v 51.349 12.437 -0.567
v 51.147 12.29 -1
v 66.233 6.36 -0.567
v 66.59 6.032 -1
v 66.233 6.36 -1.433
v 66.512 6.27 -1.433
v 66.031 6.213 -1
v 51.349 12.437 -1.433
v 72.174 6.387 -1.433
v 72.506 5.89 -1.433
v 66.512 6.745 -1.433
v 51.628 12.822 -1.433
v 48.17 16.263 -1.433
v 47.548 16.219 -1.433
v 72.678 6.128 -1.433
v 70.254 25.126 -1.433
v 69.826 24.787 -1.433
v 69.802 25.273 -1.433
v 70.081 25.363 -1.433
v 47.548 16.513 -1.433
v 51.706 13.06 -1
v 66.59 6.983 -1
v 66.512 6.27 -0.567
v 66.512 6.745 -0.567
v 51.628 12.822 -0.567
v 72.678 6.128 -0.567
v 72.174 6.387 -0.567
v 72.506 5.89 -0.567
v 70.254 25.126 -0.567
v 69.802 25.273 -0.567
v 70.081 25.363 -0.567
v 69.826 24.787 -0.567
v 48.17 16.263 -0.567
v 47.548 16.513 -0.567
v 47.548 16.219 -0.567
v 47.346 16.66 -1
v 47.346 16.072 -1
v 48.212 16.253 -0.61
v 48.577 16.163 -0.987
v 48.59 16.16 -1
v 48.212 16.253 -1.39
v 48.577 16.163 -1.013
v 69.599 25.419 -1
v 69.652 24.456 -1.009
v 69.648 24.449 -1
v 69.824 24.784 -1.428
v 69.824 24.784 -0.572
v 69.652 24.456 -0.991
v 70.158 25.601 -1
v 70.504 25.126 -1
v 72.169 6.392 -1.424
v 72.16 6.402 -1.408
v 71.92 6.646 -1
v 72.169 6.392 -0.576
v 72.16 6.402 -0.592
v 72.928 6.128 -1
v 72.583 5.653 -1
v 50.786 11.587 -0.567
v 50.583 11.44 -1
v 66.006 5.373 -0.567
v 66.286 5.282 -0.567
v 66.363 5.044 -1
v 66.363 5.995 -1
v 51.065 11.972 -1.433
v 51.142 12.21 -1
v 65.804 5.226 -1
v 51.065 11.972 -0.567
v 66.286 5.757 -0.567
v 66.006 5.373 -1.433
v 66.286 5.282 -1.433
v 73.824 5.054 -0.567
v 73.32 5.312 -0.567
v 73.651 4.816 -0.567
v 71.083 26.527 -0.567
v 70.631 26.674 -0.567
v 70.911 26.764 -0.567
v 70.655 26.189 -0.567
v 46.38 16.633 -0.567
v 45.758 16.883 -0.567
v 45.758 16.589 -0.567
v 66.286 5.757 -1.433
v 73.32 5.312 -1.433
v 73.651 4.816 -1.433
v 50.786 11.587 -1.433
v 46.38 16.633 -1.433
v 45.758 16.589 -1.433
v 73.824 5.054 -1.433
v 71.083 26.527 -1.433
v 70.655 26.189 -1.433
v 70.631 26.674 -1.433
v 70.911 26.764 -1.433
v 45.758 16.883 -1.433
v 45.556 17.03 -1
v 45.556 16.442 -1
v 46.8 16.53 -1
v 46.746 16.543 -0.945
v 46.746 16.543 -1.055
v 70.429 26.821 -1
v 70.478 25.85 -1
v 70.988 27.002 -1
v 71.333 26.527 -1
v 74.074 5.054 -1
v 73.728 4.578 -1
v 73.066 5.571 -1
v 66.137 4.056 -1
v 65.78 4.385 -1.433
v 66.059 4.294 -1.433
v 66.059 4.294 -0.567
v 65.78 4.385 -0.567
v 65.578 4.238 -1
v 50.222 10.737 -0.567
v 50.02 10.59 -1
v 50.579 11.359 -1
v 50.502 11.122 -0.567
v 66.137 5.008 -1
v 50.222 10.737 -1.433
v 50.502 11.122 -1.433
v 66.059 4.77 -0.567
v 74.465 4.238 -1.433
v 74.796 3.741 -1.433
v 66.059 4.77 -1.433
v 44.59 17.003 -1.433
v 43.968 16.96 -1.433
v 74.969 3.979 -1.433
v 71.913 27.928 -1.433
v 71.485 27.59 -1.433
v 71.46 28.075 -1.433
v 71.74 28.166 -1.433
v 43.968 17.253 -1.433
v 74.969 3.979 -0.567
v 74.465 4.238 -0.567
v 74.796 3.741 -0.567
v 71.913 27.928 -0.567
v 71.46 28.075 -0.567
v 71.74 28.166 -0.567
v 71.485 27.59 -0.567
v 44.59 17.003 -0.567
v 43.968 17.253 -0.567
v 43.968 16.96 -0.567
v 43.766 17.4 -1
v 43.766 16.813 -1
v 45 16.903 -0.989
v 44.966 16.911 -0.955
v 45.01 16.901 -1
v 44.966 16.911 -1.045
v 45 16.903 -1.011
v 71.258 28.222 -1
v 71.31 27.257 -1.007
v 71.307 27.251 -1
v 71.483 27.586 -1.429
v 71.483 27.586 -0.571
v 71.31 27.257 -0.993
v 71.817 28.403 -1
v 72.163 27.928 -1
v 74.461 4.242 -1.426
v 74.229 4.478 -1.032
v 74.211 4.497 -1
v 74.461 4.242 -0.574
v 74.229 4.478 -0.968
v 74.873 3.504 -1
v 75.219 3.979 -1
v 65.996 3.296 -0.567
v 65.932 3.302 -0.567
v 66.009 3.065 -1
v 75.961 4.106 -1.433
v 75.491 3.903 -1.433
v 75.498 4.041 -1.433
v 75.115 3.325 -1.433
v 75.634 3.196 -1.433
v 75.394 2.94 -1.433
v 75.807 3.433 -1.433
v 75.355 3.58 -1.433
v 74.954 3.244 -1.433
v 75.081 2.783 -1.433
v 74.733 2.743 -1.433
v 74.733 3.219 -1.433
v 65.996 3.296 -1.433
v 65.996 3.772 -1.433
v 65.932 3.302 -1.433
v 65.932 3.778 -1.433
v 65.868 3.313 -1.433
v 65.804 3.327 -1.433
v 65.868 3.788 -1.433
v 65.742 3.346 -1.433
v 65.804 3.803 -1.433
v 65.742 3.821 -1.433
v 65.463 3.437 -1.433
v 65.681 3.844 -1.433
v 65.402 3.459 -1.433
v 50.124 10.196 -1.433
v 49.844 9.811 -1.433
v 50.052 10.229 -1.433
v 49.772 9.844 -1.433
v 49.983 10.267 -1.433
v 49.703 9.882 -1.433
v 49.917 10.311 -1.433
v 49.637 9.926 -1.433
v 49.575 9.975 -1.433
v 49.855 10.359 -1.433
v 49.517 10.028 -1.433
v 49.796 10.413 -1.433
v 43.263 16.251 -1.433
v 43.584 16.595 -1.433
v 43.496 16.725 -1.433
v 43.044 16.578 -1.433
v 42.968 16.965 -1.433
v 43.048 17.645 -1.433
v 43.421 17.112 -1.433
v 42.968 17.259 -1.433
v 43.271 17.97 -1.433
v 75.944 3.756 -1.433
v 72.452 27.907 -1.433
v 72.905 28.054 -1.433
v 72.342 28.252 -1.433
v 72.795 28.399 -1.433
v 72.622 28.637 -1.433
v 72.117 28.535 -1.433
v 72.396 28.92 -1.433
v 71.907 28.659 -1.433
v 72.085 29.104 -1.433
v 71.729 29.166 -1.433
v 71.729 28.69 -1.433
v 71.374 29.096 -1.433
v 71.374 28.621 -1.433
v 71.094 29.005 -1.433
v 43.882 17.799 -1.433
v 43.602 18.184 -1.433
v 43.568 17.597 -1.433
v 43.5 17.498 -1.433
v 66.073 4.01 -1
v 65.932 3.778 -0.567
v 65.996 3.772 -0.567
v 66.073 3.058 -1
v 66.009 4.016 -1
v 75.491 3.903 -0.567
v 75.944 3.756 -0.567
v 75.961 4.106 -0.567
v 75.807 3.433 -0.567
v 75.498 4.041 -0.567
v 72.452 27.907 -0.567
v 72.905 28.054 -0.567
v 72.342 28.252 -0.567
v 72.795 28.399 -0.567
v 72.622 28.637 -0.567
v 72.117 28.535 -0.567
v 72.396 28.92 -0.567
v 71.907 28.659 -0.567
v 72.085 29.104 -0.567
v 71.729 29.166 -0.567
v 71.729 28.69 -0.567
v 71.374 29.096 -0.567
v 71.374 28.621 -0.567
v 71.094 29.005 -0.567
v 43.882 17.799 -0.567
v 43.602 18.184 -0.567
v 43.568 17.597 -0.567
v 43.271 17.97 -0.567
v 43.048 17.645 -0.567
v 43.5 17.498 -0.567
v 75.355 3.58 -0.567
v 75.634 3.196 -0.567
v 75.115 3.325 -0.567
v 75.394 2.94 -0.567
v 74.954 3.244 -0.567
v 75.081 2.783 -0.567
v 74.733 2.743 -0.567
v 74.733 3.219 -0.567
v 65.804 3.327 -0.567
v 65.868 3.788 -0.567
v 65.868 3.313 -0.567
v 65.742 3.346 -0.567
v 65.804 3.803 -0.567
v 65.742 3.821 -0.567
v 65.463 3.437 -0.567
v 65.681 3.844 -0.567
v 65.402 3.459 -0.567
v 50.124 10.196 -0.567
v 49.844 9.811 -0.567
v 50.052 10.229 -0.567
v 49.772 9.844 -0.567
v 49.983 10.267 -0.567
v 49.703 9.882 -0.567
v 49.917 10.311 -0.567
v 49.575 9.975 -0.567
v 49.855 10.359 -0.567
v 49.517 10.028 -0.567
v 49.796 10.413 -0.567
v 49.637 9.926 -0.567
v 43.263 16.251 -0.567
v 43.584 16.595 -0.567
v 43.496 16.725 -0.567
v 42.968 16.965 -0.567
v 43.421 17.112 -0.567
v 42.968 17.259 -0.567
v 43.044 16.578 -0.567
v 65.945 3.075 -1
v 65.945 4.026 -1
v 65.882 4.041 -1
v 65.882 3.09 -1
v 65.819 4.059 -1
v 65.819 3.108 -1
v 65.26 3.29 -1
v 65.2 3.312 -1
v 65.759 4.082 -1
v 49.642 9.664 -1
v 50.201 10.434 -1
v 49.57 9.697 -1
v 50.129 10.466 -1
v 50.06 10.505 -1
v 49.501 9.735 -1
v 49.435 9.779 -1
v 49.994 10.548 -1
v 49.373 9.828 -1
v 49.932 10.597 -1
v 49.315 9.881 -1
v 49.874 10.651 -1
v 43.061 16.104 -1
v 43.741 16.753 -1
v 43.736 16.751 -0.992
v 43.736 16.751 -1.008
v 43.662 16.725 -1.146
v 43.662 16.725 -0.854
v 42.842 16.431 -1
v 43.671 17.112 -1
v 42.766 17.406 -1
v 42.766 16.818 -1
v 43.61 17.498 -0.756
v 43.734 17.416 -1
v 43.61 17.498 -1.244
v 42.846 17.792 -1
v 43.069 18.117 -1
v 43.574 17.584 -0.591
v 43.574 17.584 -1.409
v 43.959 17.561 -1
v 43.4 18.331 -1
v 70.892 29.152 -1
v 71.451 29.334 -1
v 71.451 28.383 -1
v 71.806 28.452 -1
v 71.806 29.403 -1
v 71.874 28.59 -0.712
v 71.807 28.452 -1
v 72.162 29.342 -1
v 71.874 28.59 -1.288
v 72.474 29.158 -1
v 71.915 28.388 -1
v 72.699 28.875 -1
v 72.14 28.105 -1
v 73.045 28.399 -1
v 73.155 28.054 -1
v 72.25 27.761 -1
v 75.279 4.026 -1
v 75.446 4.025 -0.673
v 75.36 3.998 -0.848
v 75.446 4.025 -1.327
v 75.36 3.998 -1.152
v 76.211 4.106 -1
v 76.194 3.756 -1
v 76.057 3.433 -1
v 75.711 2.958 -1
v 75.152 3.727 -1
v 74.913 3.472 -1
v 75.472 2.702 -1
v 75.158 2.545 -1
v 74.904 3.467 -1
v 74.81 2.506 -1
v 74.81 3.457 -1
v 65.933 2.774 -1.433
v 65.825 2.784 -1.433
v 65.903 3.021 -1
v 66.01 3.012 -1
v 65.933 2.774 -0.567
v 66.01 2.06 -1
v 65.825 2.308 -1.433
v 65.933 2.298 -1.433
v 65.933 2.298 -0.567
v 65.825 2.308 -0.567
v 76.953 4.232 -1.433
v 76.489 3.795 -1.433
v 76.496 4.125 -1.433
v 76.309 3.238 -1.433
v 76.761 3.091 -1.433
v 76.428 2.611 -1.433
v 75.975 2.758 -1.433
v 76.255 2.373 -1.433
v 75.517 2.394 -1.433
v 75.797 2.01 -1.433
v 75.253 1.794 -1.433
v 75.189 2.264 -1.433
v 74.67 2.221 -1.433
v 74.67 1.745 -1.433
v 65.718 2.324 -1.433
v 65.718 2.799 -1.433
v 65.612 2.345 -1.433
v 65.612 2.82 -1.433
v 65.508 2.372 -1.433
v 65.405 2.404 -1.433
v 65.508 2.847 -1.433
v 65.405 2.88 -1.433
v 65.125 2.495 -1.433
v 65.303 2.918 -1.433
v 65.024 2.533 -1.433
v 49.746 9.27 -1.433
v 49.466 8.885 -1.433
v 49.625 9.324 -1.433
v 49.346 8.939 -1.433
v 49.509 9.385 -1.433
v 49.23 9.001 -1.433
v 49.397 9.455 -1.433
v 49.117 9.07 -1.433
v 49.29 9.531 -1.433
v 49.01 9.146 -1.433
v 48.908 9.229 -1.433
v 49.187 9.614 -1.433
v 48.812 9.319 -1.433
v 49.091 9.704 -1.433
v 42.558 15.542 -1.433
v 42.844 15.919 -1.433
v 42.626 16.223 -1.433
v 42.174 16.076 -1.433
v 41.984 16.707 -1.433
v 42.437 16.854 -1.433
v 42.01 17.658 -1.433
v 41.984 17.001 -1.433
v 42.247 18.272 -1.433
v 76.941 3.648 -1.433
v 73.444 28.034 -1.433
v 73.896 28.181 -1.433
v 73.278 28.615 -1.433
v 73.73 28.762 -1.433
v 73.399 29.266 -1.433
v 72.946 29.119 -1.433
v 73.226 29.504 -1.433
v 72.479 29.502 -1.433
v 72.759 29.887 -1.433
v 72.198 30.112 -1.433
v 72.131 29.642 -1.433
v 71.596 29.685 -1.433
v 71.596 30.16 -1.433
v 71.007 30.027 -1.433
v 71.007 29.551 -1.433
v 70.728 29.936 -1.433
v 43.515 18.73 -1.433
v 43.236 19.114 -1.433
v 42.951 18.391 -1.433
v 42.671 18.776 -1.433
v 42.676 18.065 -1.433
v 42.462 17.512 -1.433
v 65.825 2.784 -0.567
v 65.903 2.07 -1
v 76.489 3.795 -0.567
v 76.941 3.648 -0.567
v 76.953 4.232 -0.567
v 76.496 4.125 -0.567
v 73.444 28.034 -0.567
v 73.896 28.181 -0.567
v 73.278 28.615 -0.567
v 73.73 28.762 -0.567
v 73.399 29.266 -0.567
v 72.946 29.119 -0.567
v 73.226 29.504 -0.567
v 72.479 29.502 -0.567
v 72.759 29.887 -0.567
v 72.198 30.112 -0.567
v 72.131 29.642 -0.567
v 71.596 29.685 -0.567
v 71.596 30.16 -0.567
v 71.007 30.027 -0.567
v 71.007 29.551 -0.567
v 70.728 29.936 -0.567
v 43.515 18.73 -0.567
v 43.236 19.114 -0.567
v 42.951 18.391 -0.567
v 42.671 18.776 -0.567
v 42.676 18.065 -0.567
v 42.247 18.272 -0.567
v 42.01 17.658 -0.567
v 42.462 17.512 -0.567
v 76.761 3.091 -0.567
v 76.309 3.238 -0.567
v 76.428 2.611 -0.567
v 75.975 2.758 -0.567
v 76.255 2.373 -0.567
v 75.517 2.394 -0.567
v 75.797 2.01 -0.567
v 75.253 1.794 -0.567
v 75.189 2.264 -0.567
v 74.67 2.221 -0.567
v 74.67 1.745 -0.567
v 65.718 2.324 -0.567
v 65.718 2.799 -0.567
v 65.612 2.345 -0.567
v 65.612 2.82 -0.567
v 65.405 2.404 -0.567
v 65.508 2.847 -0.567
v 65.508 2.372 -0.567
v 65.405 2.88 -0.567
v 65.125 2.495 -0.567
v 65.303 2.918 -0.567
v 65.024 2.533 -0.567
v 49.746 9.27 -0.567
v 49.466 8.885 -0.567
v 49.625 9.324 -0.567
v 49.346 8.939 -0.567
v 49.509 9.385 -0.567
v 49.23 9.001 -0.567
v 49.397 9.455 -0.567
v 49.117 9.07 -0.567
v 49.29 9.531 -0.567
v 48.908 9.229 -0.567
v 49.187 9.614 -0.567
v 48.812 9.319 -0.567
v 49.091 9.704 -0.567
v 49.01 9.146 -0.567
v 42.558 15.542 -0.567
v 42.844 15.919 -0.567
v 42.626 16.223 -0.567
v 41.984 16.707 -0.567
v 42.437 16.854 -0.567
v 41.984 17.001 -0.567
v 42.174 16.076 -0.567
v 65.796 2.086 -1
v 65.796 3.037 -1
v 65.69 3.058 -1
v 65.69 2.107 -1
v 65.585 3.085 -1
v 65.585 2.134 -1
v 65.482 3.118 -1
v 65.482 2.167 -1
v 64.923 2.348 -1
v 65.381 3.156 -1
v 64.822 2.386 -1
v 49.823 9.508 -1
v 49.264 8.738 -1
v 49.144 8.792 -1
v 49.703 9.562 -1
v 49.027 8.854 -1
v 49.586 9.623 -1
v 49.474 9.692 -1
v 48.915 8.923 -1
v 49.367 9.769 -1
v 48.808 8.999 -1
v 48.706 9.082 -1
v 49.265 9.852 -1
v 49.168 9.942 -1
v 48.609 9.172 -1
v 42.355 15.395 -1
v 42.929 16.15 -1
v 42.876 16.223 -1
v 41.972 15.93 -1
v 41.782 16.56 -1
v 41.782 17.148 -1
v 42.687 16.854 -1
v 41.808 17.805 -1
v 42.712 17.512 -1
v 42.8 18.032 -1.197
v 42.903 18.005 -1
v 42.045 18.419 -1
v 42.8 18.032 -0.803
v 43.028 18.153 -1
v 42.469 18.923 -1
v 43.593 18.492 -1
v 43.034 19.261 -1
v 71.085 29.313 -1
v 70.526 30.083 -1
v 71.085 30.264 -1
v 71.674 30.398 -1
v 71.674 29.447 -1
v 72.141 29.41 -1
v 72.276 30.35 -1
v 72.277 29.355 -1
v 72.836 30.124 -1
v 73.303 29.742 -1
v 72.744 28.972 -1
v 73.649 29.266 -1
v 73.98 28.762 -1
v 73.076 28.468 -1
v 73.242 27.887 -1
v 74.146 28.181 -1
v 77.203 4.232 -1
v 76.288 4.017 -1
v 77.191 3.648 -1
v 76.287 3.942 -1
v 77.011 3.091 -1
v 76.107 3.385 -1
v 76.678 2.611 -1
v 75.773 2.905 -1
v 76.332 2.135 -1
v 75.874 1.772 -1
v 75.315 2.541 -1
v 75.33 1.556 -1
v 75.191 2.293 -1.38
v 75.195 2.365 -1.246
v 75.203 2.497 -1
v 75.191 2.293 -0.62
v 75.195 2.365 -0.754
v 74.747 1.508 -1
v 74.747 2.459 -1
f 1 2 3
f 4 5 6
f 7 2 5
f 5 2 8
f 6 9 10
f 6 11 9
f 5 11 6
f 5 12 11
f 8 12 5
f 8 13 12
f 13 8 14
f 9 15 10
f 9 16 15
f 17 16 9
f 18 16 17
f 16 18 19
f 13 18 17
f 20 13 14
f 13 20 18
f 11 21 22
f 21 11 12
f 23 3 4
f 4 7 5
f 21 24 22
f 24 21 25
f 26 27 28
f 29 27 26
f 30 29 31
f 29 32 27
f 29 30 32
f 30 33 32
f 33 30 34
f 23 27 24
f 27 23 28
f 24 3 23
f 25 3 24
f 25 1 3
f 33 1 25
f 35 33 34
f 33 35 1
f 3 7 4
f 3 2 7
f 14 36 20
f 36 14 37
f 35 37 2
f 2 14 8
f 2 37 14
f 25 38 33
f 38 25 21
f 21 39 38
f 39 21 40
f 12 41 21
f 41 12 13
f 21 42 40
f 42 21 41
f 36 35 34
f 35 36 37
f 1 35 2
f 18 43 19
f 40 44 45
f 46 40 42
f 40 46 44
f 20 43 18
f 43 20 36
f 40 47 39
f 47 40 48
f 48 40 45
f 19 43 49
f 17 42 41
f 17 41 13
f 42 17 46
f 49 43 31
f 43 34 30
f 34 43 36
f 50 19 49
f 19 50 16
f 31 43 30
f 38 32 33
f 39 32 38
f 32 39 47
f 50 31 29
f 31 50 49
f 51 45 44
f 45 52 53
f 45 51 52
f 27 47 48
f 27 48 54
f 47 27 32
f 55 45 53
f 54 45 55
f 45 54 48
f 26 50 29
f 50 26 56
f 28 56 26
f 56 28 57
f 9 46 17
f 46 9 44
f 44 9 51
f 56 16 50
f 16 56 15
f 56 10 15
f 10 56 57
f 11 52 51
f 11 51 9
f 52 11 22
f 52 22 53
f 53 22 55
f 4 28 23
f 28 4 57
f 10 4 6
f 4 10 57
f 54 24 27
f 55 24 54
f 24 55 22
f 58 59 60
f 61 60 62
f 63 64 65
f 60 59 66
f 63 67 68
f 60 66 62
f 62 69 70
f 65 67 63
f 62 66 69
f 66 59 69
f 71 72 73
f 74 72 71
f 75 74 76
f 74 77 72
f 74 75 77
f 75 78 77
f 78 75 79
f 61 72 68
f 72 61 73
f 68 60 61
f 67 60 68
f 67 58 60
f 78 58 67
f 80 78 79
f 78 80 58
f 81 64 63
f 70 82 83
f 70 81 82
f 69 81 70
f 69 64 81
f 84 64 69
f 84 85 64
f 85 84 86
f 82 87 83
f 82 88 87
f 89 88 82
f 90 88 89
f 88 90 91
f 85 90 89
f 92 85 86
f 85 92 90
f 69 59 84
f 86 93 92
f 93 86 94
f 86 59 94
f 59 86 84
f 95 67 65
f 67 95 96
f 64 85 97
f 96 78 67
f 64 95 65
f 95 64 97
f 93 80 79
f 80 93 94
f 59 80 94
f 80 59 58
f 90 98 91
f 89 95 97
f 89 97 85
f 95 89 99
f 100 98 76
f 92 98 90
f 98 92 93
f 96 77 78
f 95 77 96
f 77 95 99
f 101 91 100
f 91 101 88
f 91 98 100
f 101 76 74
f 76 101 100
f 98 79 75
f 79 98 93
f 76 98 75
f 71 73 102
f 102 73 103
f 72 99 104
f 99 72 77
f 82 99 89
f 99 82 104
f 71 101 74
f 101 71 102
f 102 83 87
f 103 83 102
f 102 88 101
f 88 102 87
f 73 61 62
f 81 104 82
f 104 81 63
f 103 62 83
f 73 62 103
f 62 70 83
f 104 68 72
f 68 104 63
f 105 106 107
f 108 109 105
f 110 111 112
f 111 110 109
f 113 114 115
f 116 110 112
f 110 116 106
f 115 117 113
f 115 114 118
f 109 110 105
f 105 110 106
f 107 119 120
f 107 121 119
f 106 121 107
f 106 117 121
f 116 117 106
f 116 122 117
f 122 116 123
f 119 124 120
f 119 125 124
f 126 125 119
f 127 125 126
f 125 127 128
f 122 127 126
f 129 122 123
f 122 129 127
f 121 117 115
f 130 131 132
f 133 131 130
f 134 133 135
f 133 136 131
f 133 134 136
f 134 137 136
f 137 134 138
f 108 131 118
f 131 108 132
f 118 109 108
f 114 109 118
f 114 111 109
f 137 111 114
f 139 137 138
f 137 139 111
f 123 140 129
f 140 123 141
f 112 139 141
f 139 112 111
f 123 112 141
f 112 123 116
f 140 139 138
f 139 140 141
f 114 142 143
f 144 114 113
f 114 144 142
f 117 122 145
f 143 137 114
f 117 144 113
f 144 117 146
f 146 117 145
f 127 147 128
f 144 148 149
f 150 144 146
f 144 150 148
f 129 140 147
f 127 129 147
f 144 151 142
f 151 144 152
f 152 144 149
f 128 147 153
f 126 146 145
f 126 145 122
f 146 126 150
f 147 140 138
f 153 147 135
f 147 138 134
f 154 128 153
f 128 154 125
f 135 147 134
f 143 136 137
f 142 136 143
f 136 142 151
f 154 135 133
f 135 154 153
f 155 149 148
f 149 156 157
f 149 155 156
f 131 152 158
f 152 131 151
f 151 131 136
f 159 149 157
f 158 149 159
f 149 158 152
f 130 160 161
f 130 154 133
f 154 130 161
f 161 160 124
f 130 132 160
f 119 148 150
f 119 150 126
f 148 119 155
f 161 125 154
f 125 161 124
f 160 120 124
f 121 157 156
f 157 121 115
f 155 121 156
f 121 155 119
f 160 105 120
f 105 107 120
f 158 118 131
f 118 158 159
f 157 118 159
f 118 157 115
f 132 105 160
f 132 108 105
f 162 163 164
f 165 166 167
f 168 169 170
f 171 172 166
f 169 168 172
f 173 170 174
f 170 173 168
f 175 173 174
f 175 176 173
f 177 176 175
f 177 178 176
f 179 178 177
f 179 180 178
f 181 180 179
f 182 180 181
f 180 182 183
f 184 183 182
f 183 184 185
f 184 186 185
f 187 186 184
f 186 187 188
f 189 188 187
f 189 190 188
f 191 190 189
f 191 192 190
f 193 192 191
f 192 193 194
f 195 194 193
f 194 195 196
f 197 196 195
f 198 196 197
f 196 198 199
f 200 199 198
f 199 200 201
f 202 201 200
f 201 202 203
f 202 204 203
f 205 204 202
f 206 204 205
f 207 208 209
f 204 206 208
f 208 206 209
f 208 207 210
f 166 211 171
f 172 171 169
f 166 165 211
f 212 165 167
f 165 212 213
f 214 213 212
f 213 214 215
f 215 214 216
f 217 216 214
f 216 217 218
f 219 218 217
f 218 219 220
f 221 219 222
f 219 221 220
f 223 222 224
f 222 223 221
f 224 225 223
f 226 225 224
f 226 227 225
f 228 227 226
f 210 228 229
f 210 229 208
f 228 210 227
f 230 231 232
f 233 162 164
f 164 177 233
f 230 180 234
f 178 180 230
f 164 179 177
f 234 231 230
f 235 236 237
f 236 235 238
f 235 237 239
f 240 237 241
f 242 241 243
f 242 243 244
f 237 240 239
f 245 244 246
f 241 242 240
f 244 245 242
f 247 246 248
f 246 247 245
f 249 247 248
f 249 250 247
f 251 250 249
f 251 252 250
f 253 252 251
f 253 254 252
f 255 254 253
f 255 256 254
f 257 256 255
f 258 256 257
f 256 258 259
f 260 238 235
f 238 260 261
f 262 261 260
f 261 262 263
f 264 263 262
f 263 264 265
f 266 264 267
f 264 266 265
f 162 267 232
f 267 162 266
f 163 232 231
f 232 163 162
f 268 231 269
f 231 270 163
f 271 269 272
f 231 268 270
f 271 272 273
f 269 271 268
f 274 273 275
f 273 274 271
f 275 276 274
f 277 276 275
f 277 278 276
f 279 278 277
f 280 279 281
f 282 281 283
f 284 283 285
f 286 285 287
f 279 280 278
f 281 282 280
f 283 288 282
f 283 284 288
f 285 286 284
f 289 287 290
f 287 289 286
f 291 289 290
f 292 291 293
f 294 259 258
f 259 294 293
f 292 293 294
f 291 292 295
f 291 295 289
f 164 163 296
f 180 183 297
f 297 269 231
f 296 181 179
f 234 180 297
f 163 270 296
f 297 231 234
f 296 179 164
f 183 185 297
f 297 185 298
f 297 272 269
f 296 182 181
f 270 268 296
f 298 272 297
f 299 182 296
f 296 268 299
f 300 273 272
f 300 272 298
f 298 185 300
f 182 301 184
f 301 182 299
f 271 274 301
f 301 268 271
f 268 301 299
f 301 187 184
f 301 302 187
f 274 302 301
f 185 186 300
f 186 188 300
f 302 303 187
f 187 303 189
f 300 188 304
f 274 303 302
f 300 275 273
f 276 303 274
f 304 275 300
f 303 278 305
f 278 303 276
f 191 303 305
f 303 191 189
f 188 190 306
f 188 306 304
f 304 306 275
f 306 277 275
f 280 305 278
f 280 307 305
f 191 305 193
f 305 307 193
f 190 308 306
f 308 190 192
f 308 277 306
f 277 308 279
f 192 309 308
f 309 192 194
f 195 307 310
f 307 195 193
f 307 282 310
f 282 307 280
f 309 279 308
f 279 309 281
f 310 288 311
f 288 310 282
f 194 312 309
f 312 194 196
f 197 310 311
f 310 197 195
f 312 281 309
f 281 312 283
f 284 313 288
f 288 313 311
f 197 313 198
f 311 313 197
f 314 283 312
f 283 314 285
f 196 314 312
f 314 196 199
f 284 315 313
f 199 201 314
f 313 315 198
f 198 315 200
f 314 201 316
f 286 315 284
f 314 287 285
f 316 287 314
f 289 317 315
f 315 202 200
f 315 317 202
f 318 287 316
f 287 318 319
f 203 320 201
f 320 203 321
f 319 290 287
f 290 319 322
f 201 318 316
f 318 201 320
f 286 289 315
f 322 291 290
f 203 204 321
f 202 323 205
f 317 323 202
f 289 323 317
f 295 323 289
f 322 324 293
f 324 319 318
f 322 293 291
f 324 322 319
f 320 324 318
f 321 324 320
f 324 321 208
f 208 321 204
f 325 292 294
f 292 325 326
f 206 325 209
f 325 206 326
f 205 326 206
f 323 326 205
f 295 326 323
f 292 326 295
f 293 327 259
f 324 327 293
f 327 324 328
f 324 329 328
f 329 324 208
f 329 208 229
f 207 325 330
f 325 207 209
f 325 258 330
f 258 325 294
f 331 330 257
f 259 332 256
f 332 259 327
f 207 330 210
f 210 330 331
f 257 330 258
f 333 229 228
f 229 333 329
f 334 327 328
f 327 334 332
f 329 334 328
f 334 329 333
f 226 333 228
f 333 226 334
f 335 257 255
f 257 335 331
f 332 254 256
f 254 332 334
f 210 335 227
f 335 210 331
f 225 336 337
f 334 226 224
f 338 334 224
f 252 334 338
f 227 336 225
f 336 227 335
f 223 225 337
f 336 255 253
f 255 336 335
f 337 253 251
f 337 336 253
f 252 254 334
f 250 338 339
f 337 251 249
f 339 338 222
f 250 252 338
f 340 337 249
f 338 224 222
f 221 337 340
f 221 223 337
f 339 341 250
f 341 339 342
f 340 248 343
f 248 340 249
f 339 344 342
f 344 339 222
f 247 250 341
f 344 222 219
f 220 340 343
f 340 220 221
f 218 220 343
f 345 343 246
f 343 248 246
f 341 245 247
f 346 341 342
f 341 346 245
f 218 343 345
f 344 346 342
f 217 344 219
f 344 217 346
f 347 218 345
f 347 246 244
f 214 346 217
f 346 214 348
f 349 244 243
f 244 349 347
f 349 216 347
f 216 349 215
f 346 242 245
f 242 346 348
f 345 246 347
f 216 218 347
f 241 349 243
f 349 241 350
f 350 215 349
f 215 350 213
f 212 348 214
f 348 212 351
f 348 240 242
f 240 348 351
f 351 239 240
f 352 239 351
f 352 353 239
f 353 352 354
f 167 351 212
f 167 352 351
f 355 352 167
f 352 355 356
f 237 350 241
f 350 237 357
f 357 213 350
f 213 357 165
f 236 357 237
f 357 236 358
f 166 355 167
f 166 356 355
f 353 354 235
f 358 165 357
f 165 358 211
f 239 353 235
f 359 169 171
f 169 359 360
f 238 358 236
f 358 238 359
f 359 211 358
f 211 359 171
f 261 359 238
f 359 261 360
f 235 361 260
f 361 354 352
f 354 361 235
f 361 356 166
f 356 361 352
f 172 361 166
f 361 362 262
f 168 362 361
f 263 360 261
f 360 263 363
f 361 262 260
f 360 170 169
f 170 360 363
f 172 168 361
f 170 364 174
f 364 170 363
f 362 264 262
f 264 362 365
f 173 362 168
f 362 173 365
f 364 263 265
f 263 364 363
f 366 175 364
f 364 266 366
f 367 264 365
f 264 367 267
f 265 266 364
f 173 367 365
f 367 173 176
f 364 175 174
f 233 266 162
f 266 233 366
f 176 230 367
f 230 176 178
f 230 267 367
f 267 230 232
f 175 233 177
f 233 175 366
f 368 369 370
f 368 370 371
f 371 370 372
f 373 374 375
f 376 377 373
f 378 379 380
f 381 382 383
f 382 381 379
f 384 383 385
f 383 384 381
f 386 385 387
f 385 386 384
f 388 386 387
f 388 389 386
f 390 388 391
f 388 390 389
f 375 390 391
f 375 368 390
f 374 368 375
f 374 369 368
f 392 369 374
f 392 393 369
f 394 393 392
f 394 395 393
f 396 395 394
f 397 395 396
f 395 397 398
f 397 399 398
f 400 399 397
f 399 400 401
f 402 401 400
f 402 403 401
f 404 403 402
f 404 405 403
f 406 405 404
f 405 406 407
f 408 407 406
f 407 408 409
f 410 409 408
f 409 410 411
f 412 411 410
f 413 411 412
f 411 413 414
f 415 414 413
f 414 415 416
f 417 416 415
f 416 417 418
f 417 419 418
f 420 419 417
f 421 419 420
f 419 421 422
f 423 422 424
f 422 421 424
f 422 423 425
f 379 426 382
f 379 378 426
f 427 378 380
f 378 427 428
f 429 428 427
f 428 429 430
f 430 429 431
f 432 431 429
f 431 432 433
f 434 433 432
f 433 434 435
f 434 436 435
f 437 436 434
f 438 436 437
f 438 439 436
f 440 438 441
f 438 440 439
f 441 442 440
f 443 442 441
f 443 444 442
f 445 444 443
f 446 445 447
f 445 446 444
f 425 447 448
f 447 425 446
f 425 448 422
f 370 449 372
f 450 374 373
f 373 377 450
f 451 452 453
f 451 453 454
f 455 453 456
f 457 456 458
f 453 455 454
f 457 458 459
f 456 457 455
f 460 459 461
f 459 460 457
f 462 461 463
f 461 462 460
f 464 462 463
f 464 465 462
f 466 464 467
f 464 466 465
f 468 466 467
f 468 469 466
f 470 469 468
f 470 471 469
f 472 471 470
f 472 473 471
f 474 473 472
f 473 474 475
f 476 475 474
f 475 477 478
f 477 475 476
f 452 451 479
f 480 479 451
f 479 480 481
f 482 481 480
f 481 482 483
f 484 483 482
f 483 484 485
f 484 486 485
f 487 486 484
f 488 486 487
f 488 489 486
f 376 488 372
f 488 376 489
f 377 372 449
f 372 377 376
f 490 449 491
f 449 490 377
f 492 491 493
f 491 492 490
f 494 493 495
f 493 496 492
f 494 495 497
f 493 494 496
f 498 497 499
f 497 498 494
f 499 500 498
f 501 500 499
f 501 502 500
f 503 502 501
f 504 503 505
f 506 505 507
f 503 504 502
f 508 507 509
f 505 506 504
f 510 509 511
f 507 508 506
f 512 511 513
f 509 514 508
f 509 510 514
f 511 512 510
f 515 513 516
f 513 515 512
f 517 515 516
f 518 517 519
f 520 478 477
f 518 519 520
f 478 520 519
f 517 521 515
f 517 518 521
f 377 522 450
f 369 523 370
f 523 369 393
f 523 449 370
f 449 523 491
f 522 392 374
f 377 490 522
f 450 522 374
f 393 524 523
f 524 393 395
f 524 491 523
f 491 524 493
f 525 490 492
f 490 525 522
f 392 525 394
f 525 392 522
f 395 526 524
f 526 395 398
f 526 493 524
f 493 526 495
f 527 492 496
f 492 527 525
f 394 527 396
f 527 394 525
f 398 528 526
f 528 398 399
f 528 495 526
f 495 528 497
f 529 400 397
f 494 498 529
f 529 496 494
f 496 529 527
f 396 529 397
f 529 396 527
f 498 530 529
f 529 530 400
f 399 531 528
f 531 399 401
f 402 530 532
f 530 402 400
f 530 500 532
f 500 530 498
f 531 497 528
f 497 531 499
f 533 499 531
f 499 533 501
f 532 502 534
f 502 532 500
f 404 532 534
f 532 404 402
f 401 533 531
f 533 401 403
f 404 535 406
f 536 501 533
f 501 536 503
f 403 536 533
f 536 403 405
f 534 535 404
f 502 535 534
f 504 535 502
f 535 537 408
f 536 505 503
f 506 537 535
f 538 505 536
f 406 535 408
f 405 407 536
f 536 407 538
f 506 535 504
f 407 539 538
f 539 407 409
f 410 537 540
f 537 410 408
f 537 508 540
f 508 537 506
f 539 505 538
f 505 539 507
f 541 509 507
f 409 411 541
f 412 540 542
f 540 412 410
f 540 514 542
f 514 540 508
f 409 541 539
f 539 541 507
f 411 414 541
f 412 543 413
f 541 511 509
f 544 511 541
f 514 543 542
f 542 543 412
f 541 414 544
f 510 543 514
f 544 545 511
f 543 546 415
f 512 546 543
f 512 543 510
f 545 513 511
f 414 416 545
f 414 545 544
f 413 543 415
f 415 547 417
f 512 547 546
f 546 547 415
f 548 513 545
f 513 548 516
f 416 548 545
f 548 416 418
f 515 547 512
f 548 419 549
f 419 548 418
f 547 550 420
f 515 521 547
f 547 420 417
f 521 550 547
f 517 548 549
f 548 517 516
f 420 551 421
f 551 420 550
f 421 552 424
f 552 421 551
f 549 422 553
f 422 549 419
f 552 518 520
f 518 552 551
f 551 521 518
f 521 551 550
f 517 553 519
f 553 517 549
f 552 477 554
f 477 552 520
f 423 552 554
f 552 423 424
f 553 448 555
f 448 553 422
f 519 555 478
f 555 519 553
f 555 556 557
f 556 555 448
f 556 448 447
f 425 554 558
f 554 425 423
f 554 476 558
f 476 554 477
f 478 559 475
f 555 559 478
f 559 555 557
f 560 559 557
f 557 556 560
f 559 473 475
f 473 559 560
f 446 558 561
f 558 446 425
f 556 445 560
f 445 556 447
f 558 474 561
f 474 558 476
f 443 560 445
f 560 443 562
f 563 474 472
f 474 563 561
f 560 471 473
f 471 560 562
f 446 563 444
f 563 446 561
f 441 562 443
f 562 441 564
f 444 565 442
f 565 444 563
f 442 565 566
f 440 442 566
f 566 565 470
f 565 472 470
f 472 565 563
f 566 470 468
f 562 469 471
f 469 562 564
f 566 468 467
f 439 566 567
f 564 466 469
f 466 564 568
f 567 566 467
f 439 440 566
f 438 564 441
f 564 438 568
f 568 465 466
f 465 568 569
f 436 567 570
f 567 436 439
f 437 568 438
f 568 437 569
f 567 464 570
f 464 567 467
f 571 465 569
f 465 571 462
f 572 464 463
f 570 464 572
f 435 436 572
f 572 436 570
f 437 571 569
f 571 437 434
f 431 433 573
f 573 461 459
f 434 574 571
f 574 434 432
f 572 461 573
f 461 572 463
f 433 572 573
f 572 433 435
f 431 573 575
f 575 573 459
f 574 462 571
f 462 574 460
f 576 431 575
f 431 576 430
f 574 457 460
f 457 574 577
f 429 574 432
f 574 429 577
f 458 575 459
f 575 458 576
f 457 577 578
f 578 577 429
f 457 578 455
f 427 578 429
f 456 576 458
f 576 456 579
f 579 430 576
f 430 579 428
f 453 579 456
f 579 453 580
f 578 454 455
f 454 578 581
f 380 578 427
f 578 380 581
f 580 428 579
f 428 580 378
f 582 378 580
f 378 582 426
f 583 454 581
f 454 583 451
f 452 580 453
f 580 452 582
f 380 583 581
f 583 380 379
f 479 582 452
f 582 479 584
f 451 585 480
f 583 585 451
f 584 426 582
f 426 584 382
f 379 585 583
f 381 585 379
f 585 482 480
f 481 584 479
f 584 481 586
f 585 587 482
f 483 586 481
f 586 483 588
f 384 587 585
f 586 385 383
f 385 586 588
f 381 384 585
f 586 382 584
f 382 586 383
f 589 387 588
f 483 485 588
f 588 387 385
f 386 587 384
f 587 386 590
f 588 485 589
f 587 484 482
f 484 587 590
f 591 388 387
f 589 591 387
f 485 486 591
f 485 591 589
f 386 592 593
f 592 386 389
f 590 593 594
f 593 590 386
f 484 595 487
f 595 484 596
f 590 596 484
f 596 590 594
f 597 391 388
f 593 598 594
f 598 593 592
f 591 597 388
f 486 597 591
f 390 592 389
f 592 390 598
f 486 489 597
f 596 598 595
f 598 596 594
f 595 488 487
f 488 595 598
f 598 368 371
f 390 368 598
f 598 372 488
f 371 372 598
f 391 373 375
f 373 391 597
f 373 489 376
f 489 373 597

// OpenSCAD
// 2d poly offset for simple shapes
// 
// Build on code form
// Library: round-anything
// Version: 1.0
// Author: IrevDev
// Copyright: 2017
// License: GPL 3
 
   test();
 
callExamples();


module test()
{
//p=[for(i=[0:2])[rnd(40,80),rnd(-0,30),rnd(3,30)]];
 p=buildNIpolygon([  ],2);
 r=[for(i=[0:len(p)-1])03];
     
for(t=[-2:1:2]){
o=(polyOffset( (p ), t));

 translate([0,0,-1])polyline(getpoints( polyRound(o,4+t)));
// translate([0,0,-1])polyline( getpoints(o));
}

R =polyRound(zipxyr(p,r),7);
polygon(R ); 
%translate([0,0,-1])polygon(getpoints(p));
 
 
}

 
 

module callExamples(){
    //Example of how a parametric part might be designed with this tool 
    width=20;       height=25;
    slotW=8;        slotH=15;
    slotPosition=8;
    minR=1.5;       farcornerR=6;
    internalR=3;
    points=[[0,0],[0,height],[slotPosition,height],[slotPosition,height-slotH],
    [slotPosition+slotW,height-slotH],[slotPosition+slotW,height],[width,height],[width,0]];
    radiuses=[minR,minR,minR,internalR,internalR,minR,minR,farcornerR];
    translate([-30,0,0])polygon(polyRound(zipxyr(points,radiuses)));
    %translate([-30,0,0.2])polygon(points);
    
    //Example of features 2
    //   1     2     3      4      5       6     
   b=[[-5,0],[5,3],[0,7],[8,7],[20,20],[10,0]]; //points
    br=[rnd(0,rnd(0,5)),rnd(0,rnd(0,5)),rnd(0,rnd(0,rnd(0,5))),rnd(rnd(0,5),15),rnd(0,5),rnd(rnd(0,5),20)]; //radiuses
    polygon(polyRound(zipxyr(b,br),30));
    %translate([0,0,0.2])polygon(b);
    
    
    //Example of features 3
    //   1     2       3      4       5     6
    p=[[0,0],[0,20],[15,15],[3,10],[15,0],[6,2]];//points
    pr=[rnd(1,5),rnd(1,5),rnd(0,5),rnd(0,5),rnd(0,5),rnd(2,5)];//radiuses
    translate([25,0,0])polygon(polyRound(zipxyr(p,pr),3));
    %translate([25,0,0.2])polygon(p);
//echo(polyRound(zipxyr(b,br),30));
}

function polyOffset(p,o )=
o==0?p:
 let(Lp1=last(p),Lp=Lp1+1)
[for(i=[0:last(p)])
offset3points(
p[wrap(i-1,Lp,0)],
p[wrap(i  ,Lp,0)],
p[wrap(i+1,Lp,0)], o) ]


;

function offset3points(p0, p1, p2, o) =
// clearly bad code  that manage to ofsett correctli - thoug with self intersections 
o >= 0 ?
    let (
        n01 = un(p0 - p1),
        n12 = un(p1 - p2),
        n21 = un(p2 - p1),
        pp01 = sign(o) > 0 ? -[n01.y, -n01.x] : -[n01.x, n01.y],
        pp21 = sign(o) > 0 ? [n21.y, -n21.x] : -[n21.x, n21.y]
    )
let (
    midLineNormal = un(pp01 + pp21),
    angle = angle(n21, n01),
    tanD = abs(o / sin(angle / 2)),
    center = p1 - midLineNormal * tanD
)[center.x, center.y, sign(dot(n01, pp21)) == sign(o) ? o : 0]:
let (
    n01 = un(p0 - p1),
    n12 = un(p1 - p2),
    n21 = un(p2 - p1),
    pp01 = sign(-o) > 0 ? [n01.y, -n01.x] : -[n01.x, n01.y],
    pp21 = sign(-o) > 0 ? [n12.y, -n12.x] : -[n12.y, -n12.x]
)
let (
    midLineNormal = un(pp01 + pp21),
    angle = angle(n21, n01),
    tanD = abs(-o / sin(angle / 2)),
    center = p1 - midLineNormal * tanD
)[center.x, center.y, sign(dot(n01, pp21)) == sign(-o) ? -o : 0];

function polyRound(radiipoints,fn=5)=
// reworte most of it all here heavily use of wrap function
 let(p=getpoints(radiipoints)) 
 let(r=getradii(radiipoints))
 let(Lp1=last(p),Lp=Lp1+1)
 let(edge_lengths=
[for(i=[0:last(p)]) norm(p[i]-p[wrap(i+1,Lp)]) ])
 let(limR= fitR(p,r,edge_lengths)
)
 let(
temp=[for(i=[0:last(p)]) 
round3points(
p[wrap(i-1,Lp,0)],
p[wrap(i  ,Lp,0)],
p[wrap(i+1,Lp,0)],
limR[i],r[i],
fn)])   //common trick  to flatten a list of list
    [for (a = temp )        for (b = a) b];

 
function fromTo(/*vec3*/p,/*vec3*/q)=
 
 acos(dot(p,q));

 


function angle (a,b)=let(ath=atan2(a.y, a.x), bth= atan2(b.y, b.x) ) 
    max(  ath,bth )-  min(  ath,bth );
    
 

function round3points(p1,p2,p3,r,rorg,fn)=
// move check to top, single point reurn in case of collinear
      dot(un(p1-p2),un(p2-p3))>0.98||r==0?[p2]//[p2+un(p1-p2), p2,p2+un(p3-p2)  ]
    : 
    let(ang=cosineRuleAngle(p1,p2,p3))//angle between the lines
// constrained tangD to the shortest leg p1-p2, or p2-p3
   let(tangD=min(norm(p1-p2) ,norm(p2-p3) , r/tan(ang/2)))//distance to the tangent point from p2 
 
    let(circD=r /sin(ang/2))//distance to the circle centre from p2
    let(a12=abs(atan(getGradient(p1,p2))))//angle of line 1
    let(a23=abs(atan(getGradient(p2,p3))))//angle of line 2
    
    let(vec21=p1-p2)//vector from p2 to p1
    let(vec23=p3-p2)//vector from p2 to p3
    let(dir21x=vec21[0]==0?0:vec21[0]/abs(vec21[0]))//tangent along line p2 to p1 x polerisation. Returns 1,-1 or 0
    let(dir21y=vec21[1]==0?0:vec21[1]/abs(vec21[1]))//tangent along line p2 to p1 y polerisation. Returns 1,-1 or 0
    let(dir23x=vec23[0]==0?0:vec23[0]/abs(vec23[0]))//tangent along line p3 to p1 x polerisation. Returns 1,-1 or 0
    let(dir23y=vec23[1]==0?0:vec23[1]/abs(vec23[1]))//tangent along line p3 to p1 Y polerisation. Returns 1,-1 or 0
    
    let(t12=[p2[0]+dir21x*cos(a12)*tangD,p2[1]+dir21y*sin(a12)*tangD])//tangent point along line p2 to p2 by offseting from p2
    let(t23=[p2[0]+dir23x*cos(a23)*tangD,p2[1]+dir23y*sin(a23)*tangD])//tangent point along line p2 to p3 by offseting from p2
    
    let(vec_=getMidpoint(t12,t23)-p2)//vector from P1 to the midpoint of the two tangents
    let(dirx_=vec_[0]==0?0:vec_[0]/abs(vec_[0]))//circle center point x polerisation
    let(diry_=vec_[1]==0?0:vec_[1]/abs(vec_[1]))//circle center point y polerisation
    let(a_=abs(atan(getGradient(getMidpoint(t12,t23),p2))))//angle of line from tangent midpoints to p2
    let(cen=[p2[0]+dirx_*cos(a_)*circD,p2[1]+diry_*sin(a_)*circD])//circle center by offseting from p2
    
    let(e1=(p2[0]-p1[0])*(p2[1]+p1[1]))//edge 1
    let(e2=(p3[0]-p2[0])*(p3[1]+p2[1]))//edge 2
    let(e3=(p1[0]-p3[0])*(p1[1]+p3[1]))//edge 3
    let(CWorCCW=(e1+e2+e3)/abs(e1+e2+e3))//rotation of the three points cw or ccw?
   CentreN2PointsArc(t12,t23,cen,CWorCCW,fn);
 
        
function CentreN2PointsArc(p1,p2,cen,CWorCCW,fn)=
    let(r=pointDist(p1,cen))
    let(CircA1=invtan(p1[0]-cen[0],p1[1]-cen[1]))//angle of line 1
    let(CircA2=cosineRuleAngle(p2,cen,p1))//angle between the lines
    [for(i=[0:fn]) [cos(CircA1+(CircA2/fn)*-i*CWorCCW)*r+cen[0],sin(CircA1+(CircA2/fn)*-i*CWorCCW)*r+cen[1]]];
 
function invtan(run,rise)=
    let(a=abs(atan(rise/run)))
    rise==0&&run>0?0:rise>0&&run>0?a:rise>0&&run==0?90:rise>0&&run<0?180-a:rise==0&&run<0?180:rise<0&&run<0?a+180:rise<0&&run==0?270:rise<0&&run>0?360-a:"error";

function cosineRuleAngle(p1,p2,p3)=
    let(p12=abs(pointDist(p1,p2)))
    let(p13=abs(pointDist(p1,p3)))
    let(p23=abs(pointDist(p2,p3)))
    acos((sq(p23)+sq(p12)-sq(p13))/(2*p23*p12));
    
function getIntersect(m1,m2,k1,k2)=
    let(x=(k2-k1)/(m1-m2))
    let(y=m1*x+k1)
    [x,y];

function sq(x)=x*x;
function getGradient(p1,p2)=(p2[1]-p1[1])/(p2[0]-p1[0]);
function getConstant(p,m)=p[1]-m*p[0];
function getMidpoint(p1,p2)=[(p1[0]+p2[0])/2,(p1[1]+p2[1])/2];
function pointDist(p1,p2)=sqrt(abs(sq(p1[0]-p2[0])+sq(p1[1]-p2[1])));



 module polyline(p) {for(i=[0:max(0,len(p)-1)])line(p[i],p[wrap(i+1,len(p) )]);
} // polyline plotter

module line(p1, p2 ,width=0.5) 
{ // single line plotter
    hull() {
        translate(p1) sphere(width);
        translate(p2) sphere(width);
    }
}


function fitR(p, r, edge_lengths, c =100) = 
  true?r:
  c <= 0 ?let(er=echo(c))
   r :
let (tangDs = [
for (i = [0: last(p)])
  tangDround3points(
p[wrap(i - 1, last(p) + 1, 0)], 
p[wrap(i, last(p) + 1, 0)], 
p[wrap(i + 1, last(p) + 1, 0)], 
r[i])])

let (limr = 
[for (i = [0: last(r)]) 
    let (
    next = wrap(i + 1, len(r)),
    prev = wrap(i - 1, len(r)),
    tangD1=( tangDs[i] + tangDs[prev]),
    tangD2= (tangDs[i] + tangDs[next]),
    tanga=max(tangD1,tangD2)
    ) 

tangD1 > edge_lengths[prev]|| tangD2 > edge_lengths[1] 
 && 
 !(( tangDs[i] < tangDs[prev])&& (tangDs[i] < tangDs[next]))// be gentetle with the smallest
?

let(
factor1=(edge_lengths[prev] / tangD1 ), 
factor2=(edge_lengths[ i  ] / tangD2 )   
)
 
roundr(r[i] * min(factor1,factor2)  ):r[i]

])
limr == r ?let(er=echo(c)) limr :  fitR(p, limr, edge_lengths, c - 1);


 



function tangDround3points(p1, p2, p3, r) =
  r == 0 ? 0 //[p2+un(p1-p2), p2,p2+un(p3-p2)  ]
  : let (ang = cosineRuleAngle(p1, p2, p3)) //angle between the lines
let (tangD = min(r / tan(ang / 2))) //distance to the tangent point from p2 
tangD;
function a3DtangDround3points(p1, p2, p3, r) =
  r == 0 ? 0 //[p2+un(p1-p2), p2,p2+un(p3-p2)  ]
  : let (ang = -abs(angle(p1-p2, p3-p3))) //angle between the lines
let (tangD = min(r / tan(ang / 2))) //distance to the tangent point from p2 
tangD;
function roundr(a, base = 0.01) = a - (a % base);

function buildNIpolygon(pi,c=6,smooth=0.74)=
let(p=pi==[]?[[rnd(40,80),rnd(-0,30)],[rnd(40,80),rnd(-0,30)],[rnd(40,80),rnd(-0,30)]]:pi)
c<=0? (is_clockwise(p)?p:reverse(p)):
let(np=concat([newpoint(p[0],p[last(p)])],p))
selfintesect(np)?buildNIpolygon(cycle(p,rnd(last(p))),c):buildNIpolygon(cycle(np,rnd(last(np))),c-1 );

function newpoint(a,b)=
//let(bi=rnd(),m=lerp(a,b,bi),mag=norm(a-b),n=ortho(un(a-b)) )m+n*(mag*min(bi,1-bi)*rnd(-1,1)*2)
[rnd(40,80),rnd(-0,26)];

function ortho(v)=[v.y,-v.x];
function cycle(p,n=1)=[for(i=[0:len(p)-1]) p[wrap(i+n,len(p))]];

function selfintesect(p)=
let(lp1=len(p)-1,lp=lp1+1)
let(allp=
[for(i=[0:lp1])
let(allpi=[for(j=[i:i+lp1-1])
 
let(A=p[wrap(i,lp)])
let(B=p[wrap(i+1,lp)])
let(C=p[wrap(j,lp)])
let(D=p[wrap(j+1,lp)])
intersect(A,B,C,D)
 ]
//,err=echo(allpi)
)
allfalse(allpi)]

//,err=echo(allp)
)
 !alltrue(allp);
;


function  ccw(A,B,C)=
    (C.y-A.y) * (B.x-A.x) > (B.y-A.y) * (C.x-A.x);

function intersect(A,B,C,D)=
A==B||
C==D||
B==C||
B==D||
A==C||
A==D?false:
      ccw(A,C,D) != ccw(B,C,D) && ccw(A,B,C) != ccw(A,B,D);


 function is_clockwise(p,o )=
 let(Lp1=last(p),Lp=Lp1+1,
sum= sum_vectors([for(i=[0:last(p)])
 let(
n1=p[wrap(i  ,Lp,0)],
n2=p[wrap(i+1,Lp,0)] )
(n2.x-n1.x)*(n2.y+n1.y)])
)
sum>0

;

    function sum_vectors(l) = len(l) > 0 ? [ for(li=l) 1 ] * l : undef;
function zipxyr(a,b)=[for(i=[0:last(a)])[a[i].x,a[i].y,b[i]]];
function getpoints(p)=[for(i=[0:len(p)-1])[p[i].x,p[i].y]];// gets [x,y]list of[x,y,r]list
function getradii(p)= [for(i=[0:len(p)-1])is_num(p[i][2])? p[i][2]: 0 ]; // gets [r]list of[x,y,r]list
function get3points(p)=[for(i=[0:len(p)-1])[p[i].x,p[i].y,p[i].z]];// gets [x,y]list of[x,y,r]list
function get3radii(p)= [for(i=[0:len(p)-1])p[i][3]]; // gets [r]list of[x,y,r]list
function wrap(x,x_max=1,x_min=0) = (((x - x_min) % (x_max - x_min)) + (x_max - x_min)) % (x_max - x_min) + x_min; // wraps numbers inside boundaries
function dot (a,b)=a*b; // dotproduct is implied in * of vextoes
function last(i)=len(i)-1;// shorthand sugar for len(i)-1
function reverse(v)=[for (i=[len(v)-1:-1:0])v[i]];
function un(v)=v/max(norm(v),1e-16);// div by zero safe unit normal
function rnd(a = 1, b = 0, s = []) = 
  s == [] ? 
   (rands(min(a, b), max(   a, b), 1)[0]) 
  : 
   (rands(min(a, b), max(a, b), 1, s)[0])
  ; // nice rands wrapper
function alltrue(a) =
let (b = [
  for (i = a) true]) a == b;
function allfalse(a) =
let (b = [
  for (i = a) false]) a == b;
